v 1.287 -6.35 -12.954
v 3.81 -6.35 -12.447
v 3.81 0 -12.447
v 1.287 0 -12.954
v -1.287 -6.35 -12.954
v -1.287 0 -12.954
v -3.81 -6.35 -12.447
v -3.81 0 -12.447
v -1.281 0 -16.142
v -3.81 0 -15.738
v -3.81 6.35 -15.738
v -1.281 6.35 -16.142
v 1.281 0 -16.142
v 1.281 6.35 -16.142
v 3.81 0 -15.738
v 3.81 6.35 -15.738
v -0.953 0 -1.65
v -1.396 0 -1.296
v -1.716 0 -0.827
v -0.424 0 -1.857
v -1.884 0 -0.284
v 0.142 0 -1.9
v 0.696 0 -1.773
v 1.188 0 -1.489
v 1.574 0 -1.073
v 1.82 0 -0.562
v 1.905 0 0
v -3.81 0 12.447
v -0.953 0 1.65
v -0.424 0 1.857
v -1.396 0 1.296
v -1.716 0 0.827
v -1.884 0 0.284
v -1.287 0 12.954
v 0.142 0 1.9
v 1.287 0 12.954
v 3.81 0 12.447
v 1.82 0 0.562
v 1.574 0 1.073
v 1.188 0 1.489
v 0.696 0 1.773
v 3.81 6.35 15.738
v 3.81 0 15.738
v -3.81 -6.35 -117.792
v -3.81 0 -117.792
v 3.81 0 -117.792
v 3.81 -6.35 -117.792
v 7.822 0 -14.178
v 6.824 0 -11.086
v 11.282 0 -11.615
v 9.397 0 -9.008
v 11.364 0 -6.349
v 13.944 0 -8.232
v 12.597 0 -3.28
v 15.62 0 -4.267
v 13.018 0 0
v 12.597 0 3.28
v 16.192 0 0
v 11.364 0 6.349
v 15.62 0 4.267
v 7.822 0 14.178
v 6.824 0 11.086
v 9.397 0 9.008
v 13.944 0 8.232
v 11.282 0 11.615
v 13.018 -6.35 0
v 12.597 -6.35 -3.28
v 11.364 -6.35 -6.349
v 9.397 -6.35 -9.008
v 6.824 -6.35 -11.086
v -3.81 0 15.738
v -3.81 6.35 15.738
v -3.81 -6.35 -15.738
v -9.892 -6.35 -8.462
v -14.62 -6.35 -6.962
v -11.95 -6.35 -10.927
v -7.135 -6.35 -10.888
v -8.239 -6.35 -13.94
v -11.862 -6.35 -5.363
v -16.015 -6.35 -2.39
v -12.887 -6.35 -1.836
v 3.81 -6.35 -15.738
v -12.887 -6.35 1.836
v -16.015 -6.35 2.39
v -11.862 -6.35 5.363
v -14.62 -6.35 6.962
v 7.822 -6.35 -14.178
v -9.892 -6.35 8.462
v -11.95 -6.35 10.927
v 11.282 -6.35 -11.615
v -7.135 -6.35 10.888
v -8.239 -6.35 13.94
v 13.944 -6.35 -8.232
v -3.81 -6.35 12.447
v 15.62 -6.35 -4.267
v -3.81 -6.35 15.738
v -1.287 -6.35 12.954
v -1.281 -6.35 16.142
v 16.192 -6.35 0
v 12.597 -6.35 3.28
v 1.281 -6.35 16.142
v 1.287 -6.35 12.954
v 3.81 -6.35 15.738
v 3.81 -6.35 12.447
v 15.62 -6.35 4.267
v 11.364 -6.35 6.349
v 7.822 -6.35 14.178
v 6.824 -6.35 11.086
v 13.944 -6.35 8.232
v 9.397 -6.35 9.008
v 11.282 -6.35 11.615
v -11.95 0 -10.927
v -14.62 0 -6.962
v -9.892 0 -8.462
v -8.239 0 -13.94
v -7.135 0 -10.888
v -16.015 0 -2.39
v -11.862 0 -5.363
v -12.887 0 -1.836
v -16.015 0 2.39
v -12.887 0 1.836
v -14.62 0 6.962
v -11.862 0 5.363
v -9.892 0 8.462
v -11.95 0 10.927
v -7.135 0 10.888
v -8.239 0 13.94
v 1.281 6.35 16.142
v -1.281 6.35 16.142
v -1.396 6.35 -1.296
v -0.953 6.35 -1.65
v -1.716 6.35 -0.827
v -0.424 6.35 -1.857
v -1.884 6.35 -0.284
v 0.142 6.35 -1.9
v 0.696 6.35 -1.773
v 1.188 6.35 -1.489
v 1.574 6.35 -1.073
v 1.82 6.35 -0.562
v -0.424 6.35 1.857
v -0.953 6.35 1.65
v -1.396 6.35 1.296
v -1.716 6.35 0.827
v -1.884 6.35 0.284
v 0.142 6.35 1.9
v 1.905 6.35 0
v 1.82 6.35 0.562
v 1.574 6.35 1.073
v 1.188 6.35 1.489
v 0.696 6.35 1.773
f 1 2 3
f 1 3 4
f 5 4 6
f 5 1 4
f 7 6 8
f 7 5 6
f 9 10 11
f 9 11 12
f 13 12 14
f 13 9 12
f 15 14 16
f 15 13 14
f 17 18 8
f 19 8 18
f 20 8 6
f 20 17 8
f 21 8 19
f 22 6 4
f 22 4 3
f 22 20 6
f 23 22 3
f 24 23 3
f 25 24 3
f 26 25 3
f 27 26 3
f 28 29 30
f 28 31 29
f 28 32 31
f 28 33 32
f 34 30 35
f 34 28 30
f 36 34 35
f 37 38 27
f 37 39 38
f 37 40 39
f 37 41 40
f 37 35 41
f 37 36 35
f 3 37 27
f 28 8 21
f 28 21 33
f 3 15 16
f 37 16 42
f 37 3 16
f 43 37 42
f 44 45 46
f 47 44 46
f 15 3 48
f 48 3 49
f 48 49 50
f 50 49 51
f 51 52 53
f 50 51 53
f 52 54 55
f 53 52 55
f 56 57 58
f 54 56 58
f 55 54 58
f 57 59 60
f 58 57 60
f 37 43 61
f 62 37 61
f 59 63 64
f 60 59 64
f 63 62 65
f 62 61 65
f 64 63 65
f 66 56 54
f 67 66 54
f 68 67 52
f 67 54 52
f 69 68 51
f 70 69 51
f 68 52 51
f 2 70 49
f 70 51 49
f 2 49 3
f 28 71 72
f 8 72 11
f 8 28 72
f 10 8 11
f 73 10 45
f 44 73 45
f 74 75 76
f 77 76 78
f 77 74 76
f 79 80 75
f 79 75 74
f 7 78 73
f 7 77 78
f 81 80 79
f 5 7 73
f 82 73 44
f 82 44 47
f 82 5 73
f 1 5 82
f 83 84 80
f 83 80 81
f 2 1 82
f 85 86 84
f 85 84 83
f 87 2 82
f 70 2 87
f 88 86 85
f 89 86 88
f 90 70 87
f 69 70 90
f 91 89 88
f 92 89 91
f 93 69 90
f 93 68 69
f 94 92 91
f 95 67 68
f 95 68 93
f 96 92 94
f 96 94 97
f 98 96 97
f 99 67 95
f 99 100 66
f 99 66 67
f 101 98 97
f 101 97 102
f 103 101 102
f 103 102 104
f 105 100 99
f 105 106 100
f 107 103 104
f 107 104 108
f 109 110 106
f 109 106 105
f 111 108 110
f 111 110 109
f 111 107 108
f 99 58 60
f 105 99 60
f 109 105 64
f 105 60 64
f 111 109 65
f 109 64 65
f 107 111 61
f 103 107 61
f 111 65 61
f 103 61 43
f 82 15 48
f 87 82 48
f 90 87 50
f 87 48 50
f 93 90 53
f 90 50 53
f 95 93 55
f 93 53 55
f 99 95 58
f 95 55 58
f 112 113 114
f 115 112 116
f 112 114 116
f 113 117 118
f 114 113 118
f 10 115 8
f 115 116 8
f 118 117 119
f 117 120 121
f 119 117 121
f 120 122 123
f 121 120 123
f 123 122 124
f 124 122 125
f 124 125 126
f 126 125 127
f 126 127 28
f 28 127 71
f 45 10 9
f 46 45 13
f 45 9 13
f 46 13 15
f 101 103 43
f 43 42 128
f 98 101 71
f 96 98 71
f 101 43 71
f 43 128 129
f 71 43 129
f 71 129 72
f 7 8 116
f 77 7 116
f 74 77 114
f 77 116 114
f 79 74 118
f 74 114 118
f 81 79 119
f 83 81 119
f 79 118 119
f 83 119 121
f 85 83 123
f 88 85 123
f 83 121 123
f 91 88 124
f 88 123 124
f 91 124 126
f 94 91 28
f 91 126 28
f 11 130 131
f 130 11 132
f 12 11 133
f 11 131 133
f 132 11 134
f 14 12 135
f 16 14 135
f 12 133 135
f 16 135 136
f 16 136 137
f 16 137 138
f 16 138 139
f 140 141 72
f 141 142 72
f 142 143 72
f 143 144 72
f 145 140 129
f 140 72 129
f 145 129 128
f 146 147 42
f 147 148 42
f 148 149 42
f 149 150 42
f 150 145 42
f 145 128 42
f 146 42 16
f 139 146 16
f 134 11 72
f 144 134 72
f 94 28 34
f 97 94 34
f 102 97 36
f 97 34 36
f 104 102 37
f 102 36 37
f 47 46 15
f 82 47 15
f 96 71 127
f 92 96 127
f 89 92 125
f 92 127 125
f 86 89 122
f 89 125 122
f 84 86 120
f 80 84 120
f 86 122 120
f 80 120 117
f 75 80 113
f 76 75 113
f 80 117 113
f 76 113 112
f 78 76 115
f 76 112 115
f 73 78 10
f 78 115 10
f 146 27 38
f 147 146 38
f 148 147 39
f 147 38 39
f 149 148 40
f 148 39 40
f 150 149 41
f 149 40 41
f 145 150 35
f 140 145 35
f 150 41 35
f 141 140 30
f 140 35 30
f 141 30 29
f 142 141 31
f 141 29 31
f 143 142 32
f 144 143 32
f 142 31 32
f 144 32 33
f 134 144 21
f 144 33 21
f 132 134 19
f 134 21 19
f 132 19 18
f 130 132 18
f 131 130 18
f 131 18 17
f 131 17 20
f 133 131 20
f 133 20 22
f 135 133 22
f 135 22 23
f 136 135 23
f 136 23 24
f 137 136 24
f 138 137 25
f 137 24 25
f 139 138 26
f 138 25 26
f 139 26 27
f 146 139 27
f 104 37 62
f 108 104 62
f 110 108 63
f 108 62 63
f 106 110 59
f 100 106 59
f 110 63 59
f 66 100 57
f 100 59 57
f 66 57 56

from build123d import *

# Parameters (mm, degrees)
F1_DEPTH = 6.35
F2_DEPTH = 6.35
F3_DEPTH = 6.35
F0_R     = 1.905
F4_DEPTH = 6.35


with BuildPart() as f1:
    # F0 (on Front) → F1 (new body)
    with BuildSketch(Plane.XZ):
        with BuildLine():
            Line((3.81, -117.7925), (3.81, -15.737883))
            ThreePointArc((3.81, -15.737883), (0, -16.1925), (-3.81, -15.737883))
            Line((-3.81, -15.737883), (-3.81, -117.7925))
            Line((-3.81, -117.7925), (3.81, -117.7925))
        make_face()
    extrude(amount=F1_DEPTH)



with BuildPart() as f2:
    # F0 (on Front) → F2 (new body)
    with BuildSketch(Plane.XZ):
        with BuildLine():
            Line((3.81, -12.447458), (3.81, -15.737883))
            ThreePointArc((3.81, -15.737883), (12.725771, -10.012583), (16.1925, 0))
            ThreePointArc((16.1925, 0), (12.725771, 10.012583), (3.81, 15.737883))
            Line((3.81, 15.737883), (3.81, 12.447458))
            ThreePointArc((3.81, 12.447458), (10.465467, 7.741403), (13.0175, 0))
            ThreePointArc((13.0175, 0), (10.465467, -7.741403), (3.81, -12.447458))
        make_face()
        with BuildLine():
            ThreePointArc((-3.81, 15.737883), (-16.1925, 0), (-3.81, -15.737883))
            Line((-3.81, -15.737883), (-3.81, -12.447458))
            ThreePointArc((-3.81, -12.447458), (-13.0175, 0), (-3.81, 12.447458))
            Line((-3.81, 12.447458), (-3.81, 15.737883))
        make_face()
    extrude(amount=F2_DEPTH)


with BuildPart() as f1_1:
    add(f1.part)

    add(f2.part)  # F3 merges F2
    # F0 (on Front) → F3 (join, symmetric)
    with BuildSketch(Plane.XZ):
        with BuildLine():
            Line((3.81, 12.447458), (3.81, 15.737883))
            ThreePointArc((3.81, 15.737883), (0, 16.1925), (-3.81, 15.737883))
            Line((-3.81, 15.737883), (-3.81, 12.447458))
            ThreePointArc((-3.81, 12.447458), (0, 13.0175), (3.81, 12.447458))
        make_face()
        with BuildLine():
            ThreePointArc((-3.81, -15.737883), (0, -16.1925), (3.81, -15.737883))
            Line((3.81, -15.737883), (3.81, -12.447458))
            ThreePointArc((3.81, -12.447458), (0, -13.0175), (-3.81, -12.447458))
            Line((-3.81, -12.447458), (-3.81, -15.737883))
        make_face()
    extrude(amount=F3_DEPTH, both=True)

    # F0 (on Front) → F4 (join)
    with BuildSketch(Plane.XZ):
        with BuildLine():
            ThreePointArc((-3.81, -12.447458), (0, -13.0175), (3.81, -12.447458))
            Line((3.81, -12.447458), (3.81, 12.447458))
            ThreePointArc((3.81, 12.447458), (0, 13.0175), (-3.81, 12.447458))
            Line((-3.81, 12.447458), (-3.81, -12.447458))
        make_face()
        Circle(F0_R, mode=Mode.SUBTRACT)
    extrude(amount=-F4_DEPTH)


solid = f1_1.part
